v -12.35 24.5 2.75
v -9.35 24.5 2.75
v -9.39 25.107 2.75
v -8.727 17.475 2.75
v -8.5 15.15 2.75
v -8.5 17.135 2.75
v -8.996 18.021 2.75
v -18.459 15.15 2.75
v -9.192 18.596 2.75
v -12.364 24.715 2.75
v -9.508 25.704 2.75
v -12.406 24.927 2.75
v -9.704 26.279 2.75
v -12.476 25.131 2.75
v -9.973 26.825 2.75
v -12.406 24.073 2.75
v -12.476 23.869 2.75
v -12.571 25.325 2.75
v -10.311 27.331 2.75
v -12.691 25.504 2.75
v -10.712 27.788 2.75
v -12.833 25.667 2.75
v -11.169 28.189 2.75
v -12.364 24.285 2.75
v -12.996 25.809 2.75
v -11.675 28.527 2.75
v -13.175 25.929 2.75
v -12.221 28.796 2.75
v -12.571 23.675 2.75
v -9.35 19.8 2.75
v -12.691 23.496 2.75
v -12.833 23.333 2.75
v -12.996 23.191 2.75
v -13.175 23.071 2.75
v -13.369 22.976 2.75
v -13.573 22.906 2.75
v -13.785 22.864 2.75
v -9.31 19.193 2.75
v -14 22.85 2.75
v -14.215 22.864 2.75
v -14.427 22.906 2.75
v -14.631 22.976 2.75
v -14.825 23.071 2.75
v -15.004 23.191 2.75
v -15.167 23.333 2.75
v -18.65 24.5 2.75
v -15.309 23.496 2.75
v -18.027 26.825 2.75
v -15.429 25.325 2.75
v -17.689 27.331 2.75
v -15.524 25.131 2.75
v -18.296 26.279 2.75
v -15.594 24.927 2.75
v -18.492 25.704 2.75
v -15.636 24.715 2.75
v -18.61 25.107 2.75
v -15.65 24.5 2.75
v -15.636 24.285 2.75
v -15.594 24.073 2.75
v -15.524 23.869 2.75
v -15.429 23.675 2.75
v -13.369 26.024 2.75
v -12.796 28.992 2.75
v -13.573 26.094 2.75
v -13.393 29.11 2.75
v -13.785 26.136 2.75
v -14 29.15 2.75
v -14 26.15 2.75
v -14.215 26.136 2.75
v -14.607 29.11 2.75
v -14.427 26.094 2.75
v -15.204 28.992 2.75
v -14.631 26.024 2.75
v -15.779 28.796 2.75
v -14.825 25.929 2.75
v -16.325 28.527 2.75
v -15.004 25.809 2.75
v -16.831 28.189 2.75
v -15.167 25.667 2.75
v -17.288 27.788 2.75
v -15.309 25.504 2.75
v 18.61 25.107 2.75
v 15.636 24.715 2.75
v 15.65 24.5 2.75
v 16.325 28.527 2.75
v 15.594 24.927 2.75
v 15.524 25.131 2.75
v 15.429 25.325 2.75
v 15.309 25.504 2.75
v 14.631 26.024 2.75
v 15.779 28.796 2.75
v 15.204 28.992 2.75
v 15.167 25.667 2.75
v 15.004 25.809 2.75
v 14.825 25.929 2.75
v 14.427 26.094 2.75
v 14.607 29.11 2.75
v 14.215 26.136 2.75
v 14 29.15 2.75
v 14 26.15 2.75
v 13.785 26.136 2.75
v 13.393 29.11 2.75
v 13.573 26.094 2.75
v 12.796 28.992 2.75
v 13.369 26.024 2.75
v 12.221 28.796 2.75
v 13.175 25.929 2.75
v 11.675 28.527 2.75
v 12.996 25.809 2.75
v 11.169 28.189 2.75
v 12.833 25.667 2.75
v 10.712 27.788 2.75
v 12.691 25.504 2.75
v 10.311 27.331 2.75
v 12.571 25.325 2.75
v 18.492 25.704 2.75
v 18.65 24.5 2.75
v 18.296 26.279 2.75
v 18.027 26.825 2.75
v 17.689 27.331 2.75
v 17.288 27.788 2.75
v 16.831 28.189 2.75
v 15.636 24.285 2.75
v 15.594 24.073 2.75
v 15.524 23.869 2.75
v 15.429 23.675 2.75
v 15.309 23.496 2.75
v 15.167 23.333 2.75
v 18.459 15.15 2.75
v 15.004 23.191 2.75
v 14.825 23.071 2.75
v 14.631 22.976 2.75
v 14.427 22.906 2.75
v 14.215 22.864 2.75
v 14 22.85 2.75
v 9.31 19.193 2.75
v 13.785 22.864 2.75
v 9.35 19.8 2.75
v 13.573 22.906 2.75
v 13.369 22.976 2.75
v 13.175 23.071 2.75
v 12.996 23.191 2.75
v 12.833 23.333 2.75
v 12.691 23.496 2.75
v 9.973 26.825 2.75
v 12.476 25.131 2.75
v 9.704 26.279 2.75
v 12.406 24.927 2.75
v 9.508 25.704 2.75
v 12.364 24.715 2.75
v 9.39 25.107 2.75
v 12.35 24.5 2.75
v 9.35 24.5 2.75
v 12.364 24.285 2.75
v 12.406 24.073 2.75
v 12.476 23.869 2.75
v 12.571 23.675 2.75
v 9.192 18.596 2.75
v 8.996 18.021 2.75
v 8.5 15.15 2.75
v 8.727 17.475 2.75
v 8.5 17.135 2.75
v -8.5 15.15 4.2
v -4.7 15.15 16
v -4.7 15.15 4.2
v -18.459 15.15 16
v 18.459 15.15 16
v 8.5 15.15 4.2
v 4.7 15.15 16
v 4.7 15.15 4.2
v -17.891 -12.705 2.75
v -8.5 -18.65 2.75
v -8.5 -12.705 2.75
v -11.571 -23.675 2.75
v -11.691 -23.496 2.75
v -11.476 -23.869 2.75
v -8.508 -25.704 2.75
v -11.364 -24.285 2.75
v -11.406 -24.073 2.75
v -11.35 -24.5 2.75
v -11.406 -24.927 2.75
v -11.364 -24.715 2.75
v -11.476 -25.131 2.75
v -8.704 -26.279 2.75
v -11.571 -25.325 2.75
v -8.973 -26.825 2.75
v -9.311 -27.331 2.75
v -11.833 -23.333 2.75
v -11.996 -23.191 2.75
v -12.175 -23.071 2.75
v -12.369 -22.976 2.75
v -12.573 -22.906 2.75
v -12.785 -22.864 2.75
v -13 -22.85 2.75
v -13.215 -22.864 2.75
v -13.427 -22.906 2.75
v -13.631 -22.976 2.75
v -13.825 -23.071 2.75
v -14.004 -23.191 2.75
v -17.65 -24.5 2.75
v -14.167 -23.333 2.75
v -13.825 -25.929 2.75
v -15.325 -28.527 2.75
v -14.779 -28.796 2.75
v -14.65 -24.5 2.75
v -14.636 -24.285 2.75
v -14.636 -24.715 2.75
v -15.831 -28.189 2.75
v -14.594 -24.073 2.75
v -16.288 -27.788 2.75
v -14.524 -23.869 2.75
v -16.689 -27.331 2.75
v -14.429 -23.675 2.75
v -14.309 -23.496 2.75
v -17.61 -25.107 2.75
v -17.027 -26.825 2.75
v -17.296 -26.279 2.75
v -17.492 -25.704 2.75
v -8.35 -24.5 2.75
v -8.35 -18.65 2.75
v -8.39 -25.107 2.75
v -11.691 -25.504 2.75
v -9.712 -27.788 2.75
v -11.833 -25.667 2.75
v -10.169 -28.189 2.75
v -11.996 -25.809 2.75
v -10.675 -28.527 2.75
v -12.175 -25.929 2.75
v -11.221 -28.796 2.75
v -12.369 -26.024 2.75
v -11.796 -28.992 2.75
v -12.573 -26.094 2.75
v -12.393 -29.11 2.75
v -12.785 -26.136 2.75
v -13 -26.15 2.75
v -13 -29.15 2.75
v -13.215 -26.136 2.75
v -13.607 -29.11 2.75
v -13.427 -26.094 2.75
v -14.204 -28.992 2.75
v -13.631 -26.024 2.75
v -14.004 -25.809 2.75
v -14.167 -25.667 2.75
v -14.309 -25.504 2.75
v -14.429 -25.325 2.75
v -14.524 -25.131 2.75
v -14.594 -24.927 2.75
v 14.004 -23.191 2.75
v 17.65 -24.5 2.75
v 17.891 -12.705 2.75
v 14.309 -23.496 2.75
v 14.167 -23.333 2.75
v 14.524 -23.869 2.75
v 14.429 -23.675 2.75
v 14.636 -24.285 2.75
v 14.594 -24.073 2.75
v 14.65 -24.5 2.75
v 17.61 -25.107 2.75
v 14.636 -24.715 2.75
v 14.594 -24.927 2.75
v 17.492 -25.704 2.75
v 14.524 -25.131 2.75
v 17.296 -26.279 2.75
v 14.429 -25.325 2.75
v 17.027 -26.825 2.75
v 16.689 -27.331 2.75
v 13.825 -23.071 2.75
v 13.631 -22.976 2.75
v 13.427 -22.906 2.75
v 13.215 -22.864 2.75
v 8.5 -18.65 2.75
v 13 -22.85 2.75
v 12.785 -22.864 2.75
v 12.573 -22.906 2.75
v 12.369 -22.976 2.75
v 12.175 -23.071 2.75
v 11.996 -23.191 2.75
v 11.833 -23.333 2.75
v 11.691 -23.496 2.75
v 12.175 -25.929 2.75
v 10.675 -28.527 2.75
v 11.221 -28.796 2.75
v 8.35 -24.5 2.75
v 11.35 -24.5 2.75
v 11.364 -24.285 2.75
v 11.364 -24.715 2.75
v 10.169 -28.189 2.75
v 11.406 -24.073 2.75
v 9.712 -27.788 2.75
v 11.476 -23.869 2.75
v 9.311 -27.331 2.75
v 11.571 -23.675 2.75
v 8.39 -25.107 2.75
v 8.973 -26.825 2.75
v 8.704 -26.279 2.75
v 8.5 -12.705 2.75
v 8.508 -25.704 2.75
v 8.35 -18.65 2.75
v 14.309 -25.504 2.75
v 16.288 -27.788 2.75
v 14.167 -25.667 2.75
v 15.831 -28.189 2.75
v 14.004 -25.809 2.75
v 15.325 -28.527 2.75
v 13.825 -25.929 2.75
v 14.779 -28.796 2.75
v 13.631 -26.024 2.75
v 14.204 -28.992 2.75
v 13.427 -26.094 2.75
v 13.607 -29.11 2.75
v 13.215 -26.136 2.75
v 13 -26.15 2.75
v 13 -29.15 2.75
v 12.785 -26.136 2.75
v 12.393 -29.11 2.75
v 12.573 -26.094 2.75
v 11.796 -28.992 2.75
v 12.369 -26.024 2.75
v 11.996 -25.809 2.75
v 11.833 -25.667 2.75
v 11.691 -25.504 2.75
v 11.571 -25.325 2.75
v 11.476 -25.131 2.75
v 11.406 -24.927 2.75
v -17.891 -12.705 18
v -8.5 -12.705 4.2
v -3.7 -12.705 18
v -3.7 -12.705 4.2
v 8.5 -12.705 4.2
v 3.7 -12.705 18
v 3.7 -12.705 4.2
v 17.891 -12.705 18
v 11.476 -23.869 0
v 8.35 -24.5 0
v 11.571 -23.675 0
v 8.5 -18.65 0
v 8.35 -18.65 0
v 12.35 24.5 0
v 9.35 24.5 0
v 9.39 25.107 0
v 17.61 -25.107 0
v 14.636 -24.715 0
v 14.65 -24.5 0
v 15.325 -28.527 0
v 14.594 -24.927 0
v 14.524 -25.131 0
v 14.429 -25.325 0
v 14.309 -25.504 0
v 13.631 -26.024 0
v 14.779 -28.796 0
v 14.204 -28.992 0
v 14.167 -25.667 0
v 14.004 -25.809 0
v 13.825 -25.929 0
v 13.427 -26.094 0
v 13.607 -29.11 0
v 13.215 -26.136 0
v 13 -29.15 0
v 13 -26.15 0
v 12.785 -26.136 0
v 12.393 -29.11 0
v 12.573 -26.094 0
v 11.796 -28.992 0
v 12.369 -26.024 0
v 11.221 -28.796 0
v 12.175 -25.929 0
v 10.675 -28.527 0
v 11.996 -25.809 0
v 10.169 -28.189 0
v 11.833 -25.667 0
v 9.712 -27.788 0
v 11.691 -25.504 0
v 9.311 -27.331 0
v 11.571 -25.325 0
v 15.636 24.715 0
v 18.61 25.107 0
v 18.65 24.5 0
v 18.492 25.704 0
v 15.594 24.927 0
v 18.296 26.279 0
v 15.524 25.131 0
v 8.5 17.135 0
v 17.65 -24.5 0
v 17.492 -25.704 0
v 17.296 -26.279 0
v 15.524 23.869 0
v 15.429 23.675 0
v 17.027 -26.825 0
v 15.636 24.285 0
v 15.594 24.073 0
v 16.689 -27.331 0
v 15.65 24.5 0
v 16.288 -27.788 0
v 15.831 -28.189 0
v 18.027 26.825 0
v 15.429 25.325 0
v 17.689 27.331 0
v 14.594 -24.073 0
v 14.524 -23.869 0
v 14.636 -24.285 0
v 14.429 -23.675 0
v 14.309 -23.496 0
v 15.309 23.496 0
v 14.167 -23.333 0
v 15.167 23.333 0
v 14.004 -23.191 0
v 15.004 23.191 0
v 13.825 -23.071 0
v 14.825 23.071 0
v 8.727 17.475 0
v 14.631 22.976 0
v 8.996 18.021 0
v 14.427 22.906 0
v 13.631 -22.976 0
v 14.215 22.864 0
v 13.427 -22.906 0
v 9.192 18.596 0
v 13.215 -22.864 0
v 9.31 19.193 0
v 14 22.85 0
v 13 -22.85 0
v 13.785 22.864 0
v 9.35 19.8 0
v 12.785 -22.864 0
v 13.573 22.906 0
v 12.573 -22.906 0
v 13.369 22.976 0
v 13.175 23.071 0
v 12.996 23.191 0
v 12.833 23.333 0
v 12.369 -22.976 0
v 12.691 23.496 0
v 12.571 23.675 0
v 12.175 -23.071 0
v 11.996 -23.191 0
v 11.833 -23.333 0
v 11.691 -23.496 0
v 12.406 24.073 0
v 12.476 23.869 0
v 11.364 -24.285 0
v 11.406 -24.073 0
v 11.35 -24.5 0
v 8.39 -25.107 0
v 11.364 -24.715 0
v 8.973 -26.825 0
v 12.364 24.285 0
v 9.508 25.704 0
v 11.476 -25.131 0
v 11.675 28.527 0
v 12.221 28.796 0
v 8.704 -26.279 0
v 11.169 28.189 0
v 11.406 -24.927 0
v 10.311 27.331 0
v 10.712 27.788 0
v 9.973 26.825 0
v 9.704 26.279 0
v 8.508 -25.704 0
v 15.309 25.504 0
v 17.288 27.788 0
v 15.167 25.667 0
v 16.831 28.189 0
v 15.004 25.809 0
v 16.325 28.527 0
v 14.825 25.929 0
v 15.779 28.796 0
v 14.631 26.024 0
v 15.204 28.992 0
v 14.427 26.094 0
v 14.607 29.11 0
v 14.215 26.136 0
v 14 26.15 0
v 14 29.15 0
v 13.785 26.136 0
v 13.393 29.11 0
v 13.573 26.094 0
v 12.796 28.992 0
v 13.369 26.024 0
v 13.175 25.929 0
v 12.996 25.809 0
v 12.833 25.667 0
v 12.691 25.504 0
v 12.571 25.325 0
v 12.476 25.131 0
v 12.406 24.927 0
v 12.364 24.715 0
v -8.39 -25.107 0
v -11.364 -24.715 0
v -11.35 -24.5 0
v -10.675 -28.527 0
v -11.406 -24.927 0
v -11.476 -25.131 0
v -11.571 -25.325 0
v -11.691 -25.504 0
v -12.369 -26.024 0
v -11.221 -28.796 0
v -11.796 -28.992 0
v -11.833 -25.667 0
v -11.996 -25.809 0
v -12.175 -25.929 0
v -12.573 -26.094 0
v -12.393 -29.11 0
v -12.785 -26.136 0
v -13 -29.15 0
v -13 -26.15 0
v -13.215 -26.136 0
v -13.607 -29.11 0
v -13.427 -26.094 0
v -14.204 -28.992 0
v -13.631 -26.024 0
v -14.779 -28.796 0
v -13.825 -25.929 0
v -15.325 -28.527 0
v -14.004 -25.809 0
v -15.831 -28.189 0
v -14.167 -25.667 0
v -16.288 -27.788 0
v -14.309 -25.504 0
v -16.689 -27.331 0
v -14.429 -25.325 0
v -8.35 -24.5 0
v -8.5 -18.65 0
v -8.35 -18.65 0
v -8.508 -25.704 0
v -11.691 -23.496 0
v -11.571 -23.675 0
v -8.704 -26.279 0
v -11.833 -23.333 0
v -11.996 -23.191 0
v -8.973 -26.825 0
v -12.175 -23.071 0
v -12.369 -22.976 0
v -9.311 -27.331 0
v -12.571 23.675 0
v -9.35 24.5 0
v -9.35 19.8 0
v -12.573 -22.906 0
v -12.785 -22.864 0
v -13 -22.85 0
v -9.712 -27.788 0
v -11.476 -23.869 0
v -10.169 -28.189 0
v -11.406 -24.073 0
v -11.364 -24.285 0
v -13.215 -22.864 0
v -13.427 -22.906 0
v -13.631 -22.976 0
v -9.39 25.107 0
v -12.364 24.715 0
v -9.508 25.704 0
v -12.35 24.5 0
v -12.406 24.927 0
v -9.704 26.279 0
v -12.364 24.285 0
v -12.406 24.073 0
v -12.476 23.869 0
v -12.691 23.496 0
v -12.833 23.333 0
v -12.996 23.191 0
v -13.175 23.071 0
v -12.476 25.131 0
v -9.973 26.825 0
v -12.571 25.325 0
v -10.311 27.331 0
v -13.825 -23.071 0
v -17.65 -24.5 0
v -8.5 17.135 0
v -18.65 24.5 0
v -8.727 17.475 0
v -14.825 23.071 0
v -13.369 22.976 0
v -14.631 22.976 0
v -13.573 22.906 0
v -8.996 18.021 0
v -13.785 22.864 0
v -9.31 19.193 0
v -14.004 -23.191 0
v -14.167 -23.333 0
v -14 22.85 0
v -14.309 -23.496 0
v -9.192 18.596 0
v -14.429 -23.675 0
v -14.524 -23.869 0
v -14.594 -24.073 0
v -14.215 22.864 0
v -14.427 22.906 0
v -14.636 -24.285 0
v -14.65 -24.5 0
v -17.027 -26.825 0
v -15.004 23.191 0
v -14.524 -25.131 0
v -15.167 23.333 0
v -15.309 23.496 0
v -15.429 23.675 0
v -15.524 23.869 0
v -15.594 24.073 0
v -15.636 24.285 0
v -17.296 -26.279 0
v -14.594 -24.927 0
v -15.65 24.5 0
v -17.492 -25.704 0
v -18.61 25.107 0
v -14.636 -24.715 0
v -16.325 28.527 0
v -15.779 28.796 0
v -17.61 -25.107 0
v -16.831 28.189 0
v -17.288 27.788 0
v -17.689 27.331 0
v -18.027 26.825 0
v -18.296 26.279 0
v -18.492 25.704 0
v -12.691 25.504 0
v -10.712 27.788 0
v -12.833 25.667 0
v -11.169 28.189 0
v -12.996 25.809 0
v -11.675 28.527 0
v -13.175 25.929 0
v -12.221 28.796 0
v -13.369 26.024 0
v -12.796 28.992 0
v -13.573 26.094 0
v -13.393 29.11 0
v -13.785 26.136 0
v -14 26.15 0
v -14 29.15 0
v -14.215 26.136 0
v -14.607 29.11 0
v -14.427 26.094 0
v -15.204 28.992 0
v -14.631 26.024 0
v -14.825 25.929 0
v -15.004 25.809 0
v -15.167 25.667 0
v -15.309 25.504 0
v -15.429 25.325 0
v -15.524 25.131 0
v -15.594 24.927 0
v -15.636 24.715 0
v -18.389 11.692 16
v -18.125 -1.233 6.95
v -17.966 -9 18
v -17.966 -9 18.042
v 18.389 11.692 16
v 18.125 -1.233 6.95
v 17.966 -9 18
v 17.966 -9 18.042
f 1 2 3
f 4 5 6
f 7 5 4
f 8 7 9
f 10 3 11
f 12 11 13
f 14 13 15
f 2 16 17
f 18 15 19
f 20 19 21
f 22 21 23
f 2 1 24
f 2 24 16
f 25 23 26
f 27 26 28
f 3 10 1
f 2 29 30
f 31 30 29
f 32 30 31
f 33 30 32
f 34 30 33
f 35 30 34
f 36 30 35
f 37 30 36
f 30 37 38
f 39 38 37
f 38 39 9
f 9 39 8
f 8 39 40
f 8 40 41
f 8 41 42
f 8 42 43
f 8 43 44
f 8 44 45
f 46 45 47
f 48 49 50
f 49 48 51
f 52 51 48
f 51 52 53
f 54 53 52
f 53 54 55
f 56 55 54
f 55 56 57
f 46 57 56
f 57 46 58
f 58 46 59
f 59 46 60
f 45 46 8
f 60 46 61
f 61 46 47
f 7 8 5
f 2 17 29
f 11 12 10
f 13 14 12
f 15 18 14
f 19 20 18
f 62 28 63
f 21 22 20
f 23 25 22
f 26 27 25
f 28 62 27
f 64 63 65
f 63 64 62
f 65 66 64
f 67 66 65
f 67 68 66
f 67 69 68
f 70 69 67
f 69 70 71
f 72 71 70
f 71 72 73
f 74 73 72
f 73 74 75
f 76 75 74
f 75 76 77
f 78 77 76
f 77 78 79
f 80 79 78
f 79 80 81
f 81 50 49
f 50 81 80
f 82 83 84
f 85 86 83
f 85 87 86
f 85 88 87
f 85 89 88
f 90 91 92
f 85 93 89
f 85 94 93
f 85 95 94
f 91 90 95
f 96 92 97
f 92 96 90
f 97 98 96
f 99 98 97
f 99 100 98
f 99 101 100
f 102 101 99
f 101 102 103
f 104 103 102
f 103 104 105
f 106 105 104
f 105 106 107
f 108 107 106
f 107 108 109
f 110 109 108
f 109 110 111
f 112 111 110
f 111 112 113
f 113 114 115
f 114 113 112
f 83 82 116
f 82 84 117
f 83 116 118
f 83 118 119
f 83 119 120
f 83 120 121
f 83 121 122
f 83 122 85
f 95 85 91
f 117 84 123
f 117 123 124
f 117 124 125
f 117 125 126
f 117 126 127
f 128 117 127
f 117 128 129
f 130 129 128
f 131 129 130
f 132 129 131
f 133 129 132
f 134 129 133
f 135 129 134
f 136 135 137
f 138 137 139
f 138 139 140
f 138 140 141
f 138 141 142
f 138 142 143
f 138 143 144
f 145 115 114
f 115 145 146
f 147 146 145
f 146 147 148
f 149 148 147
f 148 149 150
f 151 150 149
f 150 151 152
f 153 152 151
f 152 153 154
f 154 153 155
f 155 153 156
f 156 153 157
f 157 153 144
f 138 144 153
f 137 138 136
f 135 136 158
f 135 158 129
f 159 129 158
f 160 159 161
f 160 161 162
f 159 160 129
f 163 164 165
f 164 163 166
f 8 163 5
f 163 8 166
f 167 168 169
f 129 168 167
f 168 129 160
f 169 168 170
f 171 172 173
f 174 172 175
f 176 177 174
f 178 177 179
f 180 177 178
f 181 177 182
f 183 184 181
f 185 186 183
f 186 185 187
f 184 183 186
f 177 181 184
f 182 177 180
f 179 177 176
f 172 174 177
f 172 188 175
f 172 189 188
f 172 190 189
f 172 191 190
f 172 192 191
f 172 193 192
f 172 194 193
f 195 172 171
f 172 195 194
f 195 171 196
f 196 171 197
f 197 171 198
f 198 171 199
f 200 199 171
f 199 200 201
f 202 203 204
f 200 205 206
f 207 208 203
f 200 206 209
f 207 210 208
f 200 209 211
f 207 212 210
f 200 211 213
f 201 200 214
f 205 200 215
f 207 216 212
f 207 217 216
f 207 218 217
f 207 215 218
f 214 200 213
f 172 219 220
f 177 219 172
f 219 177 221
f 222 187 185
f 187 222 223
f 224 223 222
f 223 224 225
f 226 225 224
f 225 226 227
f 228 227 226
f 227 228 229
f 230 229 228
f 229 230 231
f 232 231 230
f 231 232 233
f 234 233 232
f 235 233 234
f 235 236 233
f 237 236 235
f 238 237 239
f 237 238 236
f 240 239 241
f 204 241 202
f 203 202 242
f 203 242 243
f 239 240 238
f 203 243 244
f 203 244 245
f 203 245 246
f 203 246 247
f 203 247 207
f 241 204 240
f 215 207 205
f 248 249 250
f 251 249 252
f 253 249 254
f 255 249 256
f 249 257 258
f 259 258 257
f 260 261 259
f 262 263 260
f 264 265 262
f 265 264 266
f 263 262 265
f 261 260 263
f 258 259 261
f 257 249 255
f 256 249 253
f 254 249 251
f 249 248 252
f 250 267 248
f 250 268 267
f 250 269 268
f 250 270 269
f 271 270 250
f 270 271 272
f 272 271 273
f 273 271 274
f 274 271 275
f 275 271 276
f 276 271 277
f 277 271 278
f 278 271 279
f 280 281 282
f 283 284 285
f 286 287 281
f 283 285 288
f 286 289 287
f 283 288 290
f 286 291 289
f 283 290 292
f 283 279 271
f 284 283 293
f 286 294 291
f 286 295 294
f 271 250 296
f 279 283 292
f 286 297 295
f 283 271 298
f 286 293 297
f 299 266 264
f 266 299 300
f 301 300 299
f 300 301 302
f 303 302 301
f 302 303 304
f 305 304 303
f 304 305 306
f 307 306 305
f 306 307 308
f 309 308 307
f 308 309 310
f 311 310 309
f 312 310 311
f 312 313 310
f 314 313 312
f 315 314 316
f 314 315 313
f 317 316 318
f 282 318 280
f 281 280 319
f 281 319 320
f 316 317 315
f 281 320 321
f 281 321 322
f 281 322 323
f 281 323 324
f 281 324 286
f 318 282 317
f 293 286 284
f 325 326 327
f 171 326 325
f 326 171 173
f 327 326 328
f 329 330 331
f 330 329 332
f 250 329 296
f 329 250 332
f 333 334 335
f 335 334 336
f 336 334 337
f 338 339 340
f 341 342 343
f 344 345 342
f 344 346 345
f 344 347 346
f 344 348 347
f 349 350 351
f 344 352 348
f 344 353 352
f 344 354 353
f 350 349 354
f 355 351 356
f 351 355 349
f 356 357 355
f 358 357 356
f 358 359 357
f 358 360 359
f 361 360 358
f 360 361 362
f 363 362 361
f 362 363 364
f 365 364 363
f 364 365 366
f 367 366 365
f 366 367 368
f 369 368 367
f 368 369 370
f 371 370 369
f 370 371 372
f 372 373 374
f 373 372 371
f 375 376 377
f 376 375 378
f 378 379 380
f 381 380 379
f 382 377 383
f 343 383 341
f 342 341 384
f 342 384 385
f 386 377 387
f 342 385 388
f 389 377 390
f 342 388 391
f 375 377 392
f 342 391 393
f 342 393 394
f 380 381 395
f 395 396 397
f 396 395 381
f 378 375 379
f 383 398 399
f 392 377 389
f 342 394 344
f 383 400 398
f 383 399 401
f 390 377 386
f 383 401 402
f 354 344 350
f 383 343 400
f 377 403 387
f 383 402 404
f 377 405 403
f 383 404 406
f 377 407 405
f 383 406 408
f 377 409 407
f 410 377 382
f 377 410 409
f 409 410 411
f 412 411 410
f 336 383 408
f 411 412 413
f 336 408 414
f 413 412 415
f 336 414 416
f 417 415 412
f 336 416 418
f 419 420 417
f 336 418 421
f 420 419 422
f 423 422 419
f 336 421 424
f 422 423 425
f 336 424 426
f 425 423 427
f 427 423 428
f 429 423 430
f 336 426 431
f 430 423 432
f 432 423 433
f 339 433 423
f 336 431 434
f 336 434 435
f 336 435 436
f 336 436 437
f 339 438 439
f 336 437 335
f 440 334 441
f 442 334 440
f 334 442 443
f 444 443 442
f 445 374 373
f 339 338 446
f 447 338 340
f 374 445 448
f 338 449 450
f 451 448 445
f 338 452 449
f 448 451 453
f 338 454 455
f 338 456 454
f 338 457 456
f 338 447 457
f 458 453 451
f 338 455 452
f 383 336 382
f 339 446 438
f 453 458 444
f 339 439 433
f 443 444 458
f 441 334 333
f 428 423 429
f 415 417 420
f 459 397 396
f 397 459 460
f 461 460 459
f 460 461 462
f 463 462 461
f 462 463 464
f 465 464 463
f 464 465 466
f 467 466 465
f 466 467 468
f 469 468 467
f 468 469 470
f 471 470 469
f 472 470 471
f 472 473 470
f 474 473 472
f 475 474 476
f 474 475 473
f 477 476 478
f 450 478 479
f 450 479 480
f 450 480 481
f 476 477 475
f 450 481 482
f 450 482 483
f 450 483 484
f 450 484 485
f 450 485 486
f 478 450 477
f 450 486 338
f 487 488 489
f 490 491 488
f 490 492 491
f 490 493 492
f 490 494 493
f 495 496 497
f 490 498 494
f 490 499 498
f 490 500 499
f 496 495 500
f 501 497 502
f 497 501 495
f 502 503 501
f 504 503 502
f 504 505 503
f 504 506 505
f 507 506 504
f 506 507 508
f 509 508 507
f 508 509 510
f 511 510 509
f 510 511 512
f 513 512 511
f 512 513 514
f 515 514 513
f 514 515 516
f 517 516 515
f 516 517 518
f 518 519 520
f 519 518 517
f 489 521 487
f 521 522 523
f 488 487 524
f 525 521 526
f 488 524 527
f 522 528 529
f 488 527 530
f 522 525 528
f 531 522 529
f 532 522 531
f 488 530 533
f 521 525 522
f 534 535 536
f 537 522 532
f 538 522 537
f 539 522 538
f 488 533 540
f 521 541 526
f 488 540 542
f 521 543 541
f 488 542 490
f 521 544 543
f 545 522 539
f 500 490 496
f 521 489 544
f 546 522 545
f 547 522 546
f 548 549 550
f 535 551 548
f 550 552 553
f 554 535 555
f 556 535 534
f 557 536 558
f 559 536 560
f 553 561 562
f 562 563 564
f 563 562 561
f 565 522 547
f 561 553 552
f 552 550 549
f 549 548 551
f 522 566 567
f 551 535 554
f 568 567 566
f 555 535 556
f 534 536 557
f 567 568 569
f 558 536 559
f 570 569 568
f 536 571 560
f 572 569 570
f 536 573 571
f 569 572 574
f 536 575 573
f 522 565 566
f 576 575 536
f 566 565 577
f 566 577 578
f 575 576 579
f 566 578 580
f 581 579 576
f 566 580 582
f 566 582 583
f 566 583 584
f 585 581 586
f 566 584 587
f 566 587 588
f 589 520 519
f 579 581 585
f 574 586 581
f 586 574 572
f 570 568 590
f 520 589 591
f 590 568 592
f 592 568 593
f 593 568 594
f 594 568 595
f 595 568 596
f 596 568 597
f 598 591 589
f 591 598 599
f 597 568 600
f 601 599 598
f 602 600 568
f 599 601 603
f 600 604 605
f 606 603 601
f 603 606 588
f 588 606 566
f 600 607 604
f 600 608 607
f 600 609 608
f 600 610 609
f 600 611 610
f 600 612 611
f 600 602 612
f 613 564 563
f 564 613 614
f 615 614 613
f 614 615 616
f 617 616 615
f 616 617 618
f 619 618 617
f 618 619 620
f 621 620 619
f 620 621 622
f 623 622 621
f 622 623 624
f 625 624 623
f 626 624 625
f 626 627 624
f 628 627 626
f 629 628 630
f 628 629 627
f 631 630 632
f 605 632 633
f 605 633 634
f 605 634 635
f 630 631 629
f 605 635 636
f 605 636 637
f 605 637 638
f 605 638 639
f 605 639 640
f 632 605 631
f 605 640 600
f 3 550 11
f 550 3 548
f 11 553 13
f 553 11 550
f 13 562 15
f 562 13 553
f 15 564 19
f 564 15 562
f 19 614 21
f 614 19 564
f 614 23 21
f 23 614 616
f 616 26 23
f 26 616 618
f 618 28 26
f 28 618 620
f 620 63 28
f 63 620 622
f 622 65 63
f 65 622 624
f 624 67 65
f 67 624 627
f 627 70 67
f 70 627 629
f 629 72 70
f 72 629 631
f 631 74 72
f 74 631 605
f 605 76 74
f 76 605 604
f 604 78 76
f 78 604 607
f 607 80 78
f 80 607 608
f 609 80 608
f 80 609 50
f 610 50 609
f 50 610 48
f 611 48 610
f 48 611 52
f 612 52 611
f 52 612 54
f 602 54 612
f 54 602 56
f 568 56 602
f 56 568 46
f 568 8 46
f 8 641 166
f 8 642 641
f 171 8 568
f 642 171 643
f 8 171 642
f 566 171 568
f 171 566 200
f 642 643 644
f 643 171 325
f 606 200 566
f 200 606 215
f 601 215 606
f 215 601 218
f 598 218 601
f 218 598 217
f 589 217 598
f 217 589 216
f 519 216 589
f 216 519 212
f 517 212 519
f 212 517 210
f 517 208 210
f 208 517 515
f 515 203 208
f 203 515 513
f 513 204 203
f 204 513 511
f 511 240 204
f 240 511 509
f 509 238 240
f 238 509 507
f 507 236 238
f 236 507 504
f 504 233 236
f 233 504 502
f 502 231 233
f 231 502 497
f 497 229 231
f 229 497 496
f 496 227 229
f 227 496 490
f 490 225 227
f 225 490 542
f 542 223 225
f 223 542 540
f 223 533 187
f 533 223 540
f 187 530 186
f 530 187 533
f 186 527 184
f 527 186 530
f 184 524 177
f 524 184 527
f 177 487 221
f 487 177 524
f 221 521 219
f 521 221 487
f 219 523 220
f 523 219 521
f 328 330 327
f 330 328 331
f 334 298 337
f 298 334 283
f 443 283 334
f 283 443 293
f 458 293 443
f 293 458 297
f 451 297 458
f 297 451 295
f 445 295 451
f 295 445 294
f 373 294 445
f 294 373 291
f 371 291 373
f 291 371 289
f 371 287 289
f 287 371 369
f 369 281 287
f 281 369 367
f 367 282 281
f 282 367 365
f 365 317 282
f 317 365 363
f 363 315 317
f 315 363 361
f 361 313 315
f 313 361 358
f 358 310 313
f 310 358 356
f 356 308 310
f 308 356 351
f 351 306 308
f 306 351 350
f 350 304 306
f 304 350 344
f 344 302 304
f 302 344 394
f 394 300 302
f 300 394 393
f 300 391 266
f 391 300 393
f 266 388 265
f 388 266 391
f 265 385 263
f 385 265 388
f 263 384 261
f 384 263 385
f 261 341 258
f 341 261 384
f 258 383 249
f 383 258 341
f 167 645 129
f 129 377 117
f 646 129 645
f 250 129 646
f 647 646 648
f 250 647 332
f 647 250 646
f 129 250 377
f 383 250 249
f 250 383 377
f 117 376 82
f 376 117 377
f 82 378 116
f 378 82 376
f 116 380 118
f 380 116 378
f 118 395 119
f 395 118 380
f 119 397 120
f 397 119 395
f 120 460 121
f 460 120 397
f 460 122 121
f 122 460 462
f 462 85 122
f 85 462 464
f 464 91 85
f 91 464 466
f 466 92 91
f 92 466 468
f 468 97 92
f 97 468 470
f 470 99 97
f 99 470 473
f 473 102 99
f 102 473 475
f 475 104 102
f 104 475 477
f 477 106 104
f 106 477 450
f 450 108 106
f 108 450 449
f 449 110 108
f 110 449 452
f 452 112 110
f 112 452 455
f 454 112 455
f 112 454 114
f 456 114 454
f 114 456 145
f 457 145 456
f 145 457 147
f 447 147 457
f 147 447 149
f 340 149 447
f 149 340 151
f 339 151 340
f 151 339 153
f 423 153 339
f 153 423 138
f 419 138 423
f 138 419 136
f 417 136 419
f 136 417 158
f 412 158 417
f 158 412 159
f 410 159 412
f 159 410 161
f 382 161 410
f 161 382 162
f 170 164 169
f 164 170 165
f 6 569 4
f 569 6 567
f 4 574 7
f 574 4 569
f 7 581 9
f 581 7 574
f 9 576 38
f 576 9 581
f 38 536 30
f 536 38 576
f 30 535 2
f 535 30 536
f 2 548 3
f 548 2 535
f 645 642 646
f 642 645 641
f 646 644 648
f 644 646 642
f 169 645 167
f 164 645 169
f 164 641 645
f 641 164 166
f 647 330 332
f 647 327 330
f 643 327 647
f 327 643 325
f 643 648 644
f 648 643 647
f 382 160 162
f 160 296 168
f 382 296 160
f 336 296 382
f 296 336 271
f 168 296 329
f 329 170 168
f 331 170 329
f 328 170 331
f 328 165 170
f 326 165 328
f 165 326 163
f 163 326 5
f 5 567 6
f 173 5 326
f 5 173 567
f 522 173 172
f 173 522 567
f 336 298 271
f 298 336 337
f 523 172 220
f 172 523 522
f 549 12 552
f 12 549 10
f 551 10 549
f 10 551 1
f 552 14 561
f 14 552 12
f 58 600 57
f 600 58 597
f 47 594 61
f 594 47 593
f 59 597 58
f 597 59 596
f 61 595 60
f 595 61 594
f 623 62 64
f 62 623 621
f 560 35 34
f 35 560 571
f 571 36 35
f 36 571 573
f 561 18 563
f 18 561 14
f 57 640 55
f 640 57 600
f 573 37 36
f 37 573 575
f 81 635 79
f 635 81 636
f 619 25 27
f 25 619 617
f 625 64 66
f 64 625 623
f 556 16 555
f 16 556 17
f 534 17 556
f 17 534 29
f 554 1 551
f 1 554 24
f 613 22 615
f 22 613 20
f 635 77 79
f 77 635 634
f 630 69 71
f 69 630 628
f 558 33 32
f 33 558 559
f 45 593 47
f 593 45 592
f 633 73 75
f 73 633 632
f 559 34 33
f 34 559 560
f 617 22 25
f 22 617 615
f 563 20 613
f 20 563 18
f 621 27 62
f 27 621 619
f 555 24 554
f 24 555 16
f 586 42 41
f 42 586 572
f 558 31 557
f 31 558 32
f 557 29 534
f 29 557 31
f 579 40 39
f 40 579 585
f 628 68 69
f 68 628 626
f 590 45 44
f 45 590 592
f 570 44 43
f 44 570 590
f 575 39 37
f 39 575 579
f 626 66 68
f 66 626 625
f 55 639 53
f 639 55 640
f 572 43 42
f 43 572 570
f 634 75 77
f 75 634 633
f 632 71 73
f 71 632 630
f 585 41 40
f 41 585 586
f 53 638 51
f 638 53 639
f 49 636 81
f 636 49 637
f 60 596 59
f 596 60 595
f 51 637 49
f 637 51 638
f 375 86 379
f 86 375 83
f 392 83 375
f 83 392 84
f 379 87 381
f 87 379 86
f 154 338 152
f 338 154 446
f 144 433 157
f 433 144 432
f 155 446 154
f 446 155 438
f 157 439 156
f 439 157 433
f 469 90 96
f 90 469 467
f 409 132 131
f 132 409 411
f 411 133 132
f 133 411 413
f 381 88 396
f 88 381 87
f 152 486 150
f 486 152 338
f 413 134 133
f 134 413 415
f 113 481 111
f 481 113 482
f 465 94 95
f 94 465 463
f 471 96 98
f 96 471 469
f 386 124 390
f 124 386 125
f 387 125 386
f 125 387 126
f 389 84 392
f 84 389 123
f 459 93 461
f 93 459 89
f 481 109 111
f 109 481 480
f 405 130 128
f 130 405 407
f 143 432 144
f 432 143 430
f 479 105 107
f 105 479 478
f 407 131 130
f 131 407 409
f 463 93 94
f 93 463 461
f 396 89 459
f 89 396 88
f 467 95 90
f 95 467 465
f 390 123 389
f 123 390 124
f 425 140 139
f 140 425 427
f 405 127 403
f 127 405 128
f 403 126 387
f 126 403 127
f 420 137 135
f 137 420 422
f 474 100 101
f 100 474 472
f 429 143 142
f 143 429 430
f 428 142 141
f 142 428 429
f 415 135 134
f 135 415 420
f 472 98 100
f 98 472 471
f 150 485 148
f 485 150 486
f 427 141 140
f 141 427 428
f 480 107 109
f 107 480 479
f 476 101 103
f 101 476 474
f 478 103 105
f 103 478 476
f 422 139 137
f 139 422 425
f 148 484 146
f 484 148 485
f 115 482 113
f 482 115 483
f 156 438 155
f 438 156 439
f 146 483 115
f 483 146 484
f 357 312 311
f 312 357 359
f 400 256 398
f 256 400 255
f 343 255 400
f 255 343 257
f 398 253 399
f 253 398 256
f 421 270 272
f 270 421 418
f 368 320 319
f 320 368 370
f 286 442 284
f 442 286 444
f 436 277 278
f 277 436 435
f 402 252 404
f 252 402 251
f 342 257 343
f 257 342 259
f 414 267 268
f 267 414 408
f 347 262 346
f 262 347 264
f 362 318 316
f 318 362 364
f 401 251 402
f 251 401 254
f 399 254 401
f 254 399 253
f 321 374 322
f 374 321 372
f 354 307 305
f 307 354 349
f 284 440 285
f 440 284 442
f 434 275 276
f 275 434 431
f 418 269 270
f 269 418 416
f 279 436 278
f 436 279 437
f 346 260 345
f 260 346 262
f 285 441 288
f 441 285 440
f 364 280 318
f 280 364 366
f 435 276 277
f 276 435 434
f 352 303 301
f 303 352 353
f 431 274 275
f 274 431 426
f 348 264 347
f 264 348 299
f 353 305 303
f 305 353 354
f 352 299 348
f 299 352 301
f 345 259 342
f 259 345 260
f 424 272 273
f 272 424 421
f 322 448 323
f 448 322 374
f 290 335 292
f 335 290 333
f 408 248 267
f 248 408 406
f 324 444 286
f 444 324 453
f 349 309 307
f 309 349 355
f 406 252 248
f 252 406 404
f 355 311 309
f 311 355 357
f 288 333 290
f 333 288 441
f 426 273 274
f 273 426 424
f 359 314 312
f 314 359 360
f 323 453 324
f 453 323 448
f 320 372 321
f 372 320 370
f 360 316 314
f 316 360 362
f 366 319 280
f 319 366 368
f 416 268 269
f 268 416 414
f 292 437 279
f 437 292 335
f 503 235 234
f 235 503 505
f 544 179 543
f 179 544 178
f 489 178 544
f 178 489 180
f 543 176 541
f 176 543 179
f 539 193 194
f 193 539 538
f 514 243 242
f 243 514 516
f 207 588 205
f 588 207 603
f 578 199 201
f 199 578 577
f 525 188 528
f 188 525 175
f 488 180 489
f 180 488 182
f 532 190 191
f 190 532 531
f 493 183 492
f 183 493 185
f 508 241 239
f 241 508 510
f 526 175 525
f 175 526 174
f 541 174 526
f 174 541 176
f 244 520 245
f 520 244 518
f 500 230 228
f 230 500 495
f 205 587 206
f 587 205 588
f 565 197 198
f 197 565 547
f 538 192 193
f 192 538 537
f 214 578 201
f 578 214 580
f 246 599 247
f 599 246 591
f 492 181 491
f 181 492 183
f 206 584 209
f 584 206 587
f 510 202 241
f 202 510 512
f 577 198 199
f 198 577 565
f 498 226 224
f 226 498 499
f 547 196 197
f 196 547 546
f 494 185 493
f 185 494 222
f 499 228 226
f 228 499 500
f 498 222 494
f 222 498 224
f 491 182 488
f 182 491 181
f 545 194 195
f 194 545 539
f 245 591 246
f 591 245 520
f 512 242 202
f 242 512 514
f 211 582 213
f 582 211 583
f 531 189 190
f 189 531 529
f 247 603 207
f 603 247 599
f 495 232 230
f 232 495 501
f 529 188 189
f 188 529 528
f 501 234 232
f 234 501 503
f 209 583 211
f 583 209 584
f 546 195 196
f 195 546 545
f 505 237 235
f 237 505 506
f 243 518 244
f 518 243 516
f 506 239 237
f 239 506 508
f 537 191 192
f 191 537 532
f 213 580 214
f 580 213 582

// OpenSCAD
//Depth of camera
camera_depth = 20;
//Height of the supporting back
back_height = 20;
//C/C Distance between front holes
front_cc = 28;
//C/C Distance between rear holes
rear_cc = 26;
//C/C Distance between front and rear holes
front_rear_cc = 49;
//angle of camera
angle = 35; //[10:45]
//Thickness of the base
base_thickness = 2.75;
//Hole diameter (may need adjustment depending on printer)
hole_size = 3.3;
//Determines the amount of "meat" around the holes
edge_margin = 3;
//Diameter of screw head (to allow enough clerance)
screw_head_size = 6.1;
//Wedge offset from front
front_offset = 14;
//Add lip to fron of wedge
use_lip = "No"; //[Yes,No]
//Velcro strap width
velcro_width = 17;
//Velcro strap thickness
velcro_thickness = 4.2;
//antenna holder angle
angle2 = 85;
antDist = 7;


//Calculated variables wont be visible to Thingiverse customizer
hole_clearence = edge_margin+hole_size/2;
screw_head_clerance = screw_head_size / 2;
hole_radius = hole_size / 2;
lip_thickness = use_lip == "Yes" ? 5*1 : 0*1;
lip_height =  use_lip == "Yes" ? 5*1 : 0*1;

//internal global varaibles
_xFrontOffset = front_cc/2;
_xRearOffset = rear_cc/2;
_xTotFrontOffset = front_cc/2+hole_clearence;
_xTotRearOffset = rear_cc/2+hole_clearence;
_yOffset = front_rear_cc/2;
_yTotOffset = front_rear_cc/2+hole_clearence;
_cameraHolderDepth = (lip_thickness+camera_depth)*cos(angle)+back_height*sin(angle)+lip_thickness;
_cameraHolderHeight = back_height*cos(angle) + base_thickness + velcro_thickness;
_wedgeStartYoffset = _yTotOffset - front_offset;
_wedgeEndYoffset = _yTotOffset - front_offset - _cameraHolderDepth;
_rearSpaceLeft = _yTotOffset * 2 - front_offset - _cameraHolderDepth;
_totWidth = front_cc > rear_cc ? front_cc + hole_clearence*2 : rear_cc + hole_clearence*2;
_velcroXpos = (velcro_width + edge_margin) < (front_cc+2*edge_margin+hole_size) / 2 ? 0 :  ((front_cc+2*edge_margin+hole_size) / 2 )-(velcro_width + edge_margin);


/**
 *
 */
module tube(inDia, outDia, height) {
	difference(){
		cylinder(h = height, r = outDia/2, $fn=50);
		translate([0, 0, -0.5]) { cylinder(h = height+1, r = inDia/2, $fn=30); }
	}
}

module createBase()
{   
           
    difference()
    {
        linear_extrude( height = _cameraHolderHeight)
        {
            union()
            {
                if( front_offset > 0 )
                {
                    polygon(
                                points = [  [-_xTotFrontOffset, _yOffset],
                                            [-_xFrontOffset+hole_clearence, _yOffset],
                                            [-_xFrontOffset+hole_clearence, _wedgeStartYoffset],
                                            [_xFrontOffset-hole_clearence, _wedgeStartYoffset],
                                            [_xFrontOffset-hole_clearence, _yOffset],
                                            [_xTotFrontOffset, _yOffset], 
                                            [_xTotRearOffset, -_yOffset], 
                                            [_xRearOffset-hole_clearence, -_yOffset], 
                                            [_xRearOffset-hole_clearence, _wedgeEndYoffset], 
                                            [-_xRearOffset+hole_clearence, _wedgeEndYoffset], 
                                            [-_xRearOffset+hole_clearence, -_yOffset], 
                                            [-_xTotRearOffset, -_yOffset] ], 
                                convexity = 10);
                } else {
                    polygon(
                                points = [  [-_xFrontOffset, _yOffset+hole_clearence],                                        [_xFrontOffset, _yOffset+hole_clearence], 
                                            [_xTotFrontOffset, _yOffset], 
                                            [_xTotRearOffset, -_yOffset], 
                                            [_xRearOffset-hole_clearence, -_yOffset], 
                                            [_xRearOffset-hole_clearence, _wedgeEndYoffset], 
                                            [-_xRearOffset+hole_clearence, _wedgeEndYoffset], 
                                            [-_xRearOffset+hole_clearence, -_yOffset], 
                                            [-_xTotRearOffset, -_yOffset],
                                            [-_xTotFrontOffset, _yOffset]],
                                convexity = 10);
                }
                translate([-_xFrontOffset, _yOffset, 0])
                circle(r=hole_clearence, center = false); 
                translate([_xFrontOffset, _yOffset, 0])
                circle(r=hole_clearence, center = false); 
                translate([_xRearOffset, -_yOffset, 0])
                circle(r=hole_clearence, center = false); 
                translate([-_xRearOffset, -_yOffset, 0])
                circle(r=hole_clearence, center = false); 
                if(front_offset > hole_clearence*2)
                {
                    difference()
                    {
                        union()
                        {
                            translate([_xFrontOffset-hole_clearence*2, _wedgeStartYoffset, 0])
                            square([hole_clearence,hole_clearence]);
                            translate([-_xFrontOffset+hole_clearence, _wedgeStartYoffset, 0])
                            square([hole_clearence,hole_clearence]);
                        }
                        union()
                        {
                            translate([_xFrontOffset-hole_clearence*2, _wedgeStartYoffset+hole_clearence, 0])
                            circle(r=hole_clearence, center = false); 
                            translate([-_xFrontOffset+hole_clearence*2, _wedgeStartYoffset+hole_clearence, 0])                circle(r=hole_clearence, center = false);   
                        }
                    }
                }
                if((_yTotOffset + _wedgeEndYoffset) > hole_clearence*2)
                {
                    difference()
                    {
                        union()
                        {
                            translate([_xRearOffset-hole_clearence*2, _wedgeEndYoffset-hole_clearence, 0])
                            square([hole_clearence,hole_clearence]);
                            translate([-_xRearOffset+hole_clearence, _wedgeEndYoffset-hole_clearence, 0])
                            square([hole_clearence,hole_clearence]);
                            
                        }
                        union()
                        {
                            translate([_xRearOffset-hole_clearence*2, _wedgeEndYoffset-hole_clearence, 0])
                            circle(r=hole_clearence, center = false); 
                            translate([-_xRearOffset+hole_clearence*2, _wedgeEndYoffset-hole_clearence, 0])
                            circle(r=hole_clearence, center = false); 
                        }
                    }
                }
            }
        }
        union()
        {
            translate([-_totWidth/2, _wedgeStartYoffset, base_thickness])
            cube([_totWidth,front_rear_cc,_cameraHolderHeight], center = false);
            rearSpace = _yTotOffset + _wedgeEndYoffset;
            translate([-_totWidth/2, _wedgeEndYoffset-rearSpace, base_thickness])
            cube([_totWidth,rearSpace,_cameraHolderHeight], center = false);
        }
    }    
}

module addWedge()
{
    totWidth = front_cc > rear_cc ? front_cc + edge_margin*2+hole_size: rear_cc + edge_margin*2+hole_size;
                xOffset = totWidth/2;  
    difference()
    {
        difference()
        {
            children();
            union()
            {
                          
                yOffset = (front_rear_cc/2+edge_margin+hole_size/2)-(lip_thickness+camera_depth)*cos(angle) -front_offset;
                translate([-xOffset, yOffset, base_thickness+velcro_thickness])
                rotate([angle,0,0])
                cube([totWidth, camera_depth, back_height+5], center = false);
                
                
        }
       union()
       {
           yOffset = (front_rear_cc/2+edge_margin+hole_size/2)-lip_thickness*cos(angle) -front_offset; 
                zOffset = base_thickness+velcro_thickness + camera_depth*sin(angle);
                translate([-xOffset, yOffset, zOffset])
                rotate([angle,0,0])
                translate([0, -1, lip_height])
                cube([totWidth, front_rear_cc, back_height+5], center = false);
                translate([-xOffset, yOffset, zOffset])
                rotate([angle,0,0])
                translate([0, lip_thickness, 0])
                cube([totWidth, front_rear_cc, back_height+5], center = false);
           
       } 
    }
    
        translate([0,15,10+16]) cube([50, 10, 20], center = true);
        translate([0,-14,10+18]) cube([50, 10, 20], center = true);
    }
    
    
}

module addStrapHole()
{
    difference()
    {
        children();
        union()
        {
            /****
            yOffset = (front_rear_cc/2+edge_margin+hole_size/2)-lip_thickness*cos(angle) -front_offset; 
            zOffset = base_thickness+velcro_thickness + camera_depth*sin(angle);
            translate([0, yOffset, zOffset])
            rotate([angle,0,0])
            translate([_velcroXpos, 0, -zOffset+base_thickness])
            cube([velcro_width, lip_thickness+1, zOffset*2], center = false);
            ySize = camera_depth + base_thickness + velcro_thickness;
            translate([0, yOffset, zOffset])
            rotate([angle,0,0])            
            translate([_velcroXpos, -ySize, -base_thickness-velcro_thickness])
            cube([velcro_width, ySize+1, velcro_thickness], center = false);
            translate([0, yOffset, zOffset])
            rotate([angle,0,0])            
            translate([_velcroXpos, -ySize, -base_thickness-velcro_thickness])            
            cube([velcro_width, velcro_thickness, back_height*1.5], center = false);
            ****/
            
            /***
            translate([0,6,base_thickness+velcro_thickness]){ 
                rotate([angle,0,0]){
                    cube([_totWidth, velcro_width, velcro_thickness], center = true);
                }
            }
            ***/
            
            translate([0,0,velcro_thickness/2]){ 
                    cube([velcro_width,_totWidth, velcro_thickness], center = true);
            }
            
            translate([0,_wedgeStartYoffset+4.2,0]){
                ///rotate([angle,0,0]) cube([velcro_width,5.5, 40], center = true);
            }
        }
    }
}

module clearForScrews()
{
    xOffsetFront = front_cc/2;
    xOffsetRear = rear_cc/2;
    yOffset = front_rear_cc/2;
    
    difference()
    {
        children();
        union()
        {
            //Screw holes
            translate([-xOffsetFront, yOffset, (base_thickness+1)/2])
            cylinder(h=base_thickness+1, r=hole_radius, center = true); 
            translate([xOffsetFront, yOffset, (base_thickness+1)/2])
            cylinder(h=base_thickness+1, r=hole_radius, center = true); 
            translate([xOffsetRear, -yOffset, (base_thickness+1)/2])
            cylinder(h=base_thickness+1, r=hole_radius, center = true); 
            translate([-xOffsetRear, -yOffset, (base_thickness+1)/2])
            cylinder(h=base_thickness+1, r=hole_radius, center = true); 
            translate([xOffsetRear, -yOffset, 50+base_thickness])
            cylinder(h=100, r=screw_head_clerance, center = true);        translate([-xOffsetRear, -yOffset, 50+base_thickness])
            cylinder(h=100, r=screw_head_clerance, center = true);
            translate([-xOffsetFront, yOffset, 50+base_thickness])
            cylinder(h=100, r=screw_head_clerance, center = true);
            translate([xOffsetFront, yOffset, 50+base_thickness])
            cylinder(h=100, r=screw_head_clerance, center = true);
            /***
            for(i=[-1,1]){
            translate([i*antDist/2,-front_rear_cc/2-1,0]) rotate([0,i*angle2/2,0]) cylinder(r=hole_size/2, h=90, $fn=20,center=true);
}
            ***/
        }
    }
}


$fn = 48;
clearForScrews()
{
    addStrapHole()
    {
        addWedge()
        {
            createBase();
        }
    }
}

/**
//antenna holder
difference(){

for(i=[-1,1]){
translate([i*antDist/2,-front_rear_cc/2-1,0]) rotate([0,i*angle2/2,0]) tube(hole_size, 7.5, 15);
}

translate([0,0,-10/2]) cube(size=[100,100,10], center=true);
for(i=[-1,1]){
translate([i*antDist/2, -front_rear_cc/2-1,10/2+8]) cube(size=[27,10,10], center=true);
}

}//diff
**/
